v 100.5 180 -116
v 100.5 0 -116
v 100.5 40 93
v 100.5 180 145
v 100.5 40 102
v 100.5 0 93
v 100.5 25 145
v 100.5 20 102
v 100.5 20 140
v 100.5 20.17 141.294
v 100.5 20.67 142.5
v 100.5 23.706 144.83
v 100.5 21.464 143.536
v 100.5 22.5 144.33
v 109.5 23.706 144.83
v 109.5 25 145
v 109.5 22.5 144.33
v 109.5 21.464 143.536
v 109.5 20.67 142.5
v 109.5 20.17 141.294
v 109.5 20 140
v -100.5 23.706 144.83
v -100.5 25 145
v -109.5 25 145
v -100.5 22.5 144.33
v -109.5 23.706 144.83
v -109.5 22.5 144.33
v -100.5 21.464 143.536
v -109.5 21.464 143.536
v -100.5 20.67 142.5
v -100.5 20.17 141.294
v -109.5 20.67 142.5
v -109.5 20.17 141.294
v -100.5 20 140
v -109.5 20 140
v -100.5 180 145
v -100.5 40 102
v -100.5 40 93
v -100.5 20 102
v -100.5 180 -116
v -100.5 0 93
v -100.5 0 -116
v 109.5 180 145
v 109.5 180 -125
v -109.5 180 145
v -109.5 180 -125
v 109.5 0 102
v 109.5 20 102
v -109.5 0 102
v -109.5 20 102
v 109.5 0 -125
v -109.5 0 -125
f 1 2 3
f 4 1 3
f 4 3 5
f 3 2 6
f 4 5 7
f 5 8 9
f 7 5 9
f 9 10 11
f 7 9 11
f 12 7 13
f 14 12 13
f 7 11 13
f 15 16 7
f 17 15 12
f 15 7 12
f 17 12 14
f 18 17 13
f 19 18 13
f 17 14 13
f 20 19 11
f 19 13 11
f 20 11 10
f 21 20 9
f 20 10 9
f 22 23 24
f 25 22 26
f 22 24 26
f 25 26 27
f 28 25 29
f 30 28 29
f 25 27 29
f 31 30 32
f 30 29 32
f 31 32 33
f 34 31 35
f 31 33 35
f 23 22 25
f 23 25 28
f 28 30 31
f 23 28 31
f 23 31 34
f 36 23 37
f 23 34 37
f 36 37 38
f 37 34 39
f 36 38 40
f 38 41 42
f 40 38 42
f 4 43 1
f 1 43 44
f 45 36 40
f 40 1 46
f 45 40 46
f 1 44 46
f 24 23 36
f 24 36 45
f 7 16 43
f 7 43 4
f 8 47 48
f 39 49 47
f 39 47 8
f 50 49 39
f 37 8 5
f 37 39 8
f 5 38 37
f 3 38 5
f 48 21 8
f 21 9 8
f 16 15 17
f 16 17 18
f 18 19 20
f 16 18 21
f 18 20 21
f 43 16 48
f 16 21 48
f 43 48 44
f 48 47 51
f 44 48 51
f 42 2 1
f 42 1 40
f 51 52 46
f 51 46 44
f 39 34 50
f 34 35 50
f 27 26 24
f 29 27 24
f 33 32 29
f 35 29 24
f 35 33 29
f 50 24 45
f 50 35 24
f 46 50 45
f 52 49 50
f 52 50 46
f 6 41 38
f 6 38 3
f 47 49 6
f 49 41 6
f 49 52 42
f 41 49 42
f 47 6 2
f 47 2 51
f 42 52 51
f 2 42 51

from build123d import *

# Parameters (mm, degrees)
SKETCH1_W               = 219
SKETCH1_H               = 250
BOSS_EXTRUDE1_DEPTH     = 3
EXTRUDE_THIN1_DEPTH     = 180
CUT_EXTRUDE2_DEPTH      = 256.764051422
CUT_EXTRUDE2_DEPTH_BACK = 256.764051422
SKETCH4_W               = 65.933085688
SKETCH4_H               = 20
SKETCH7_W               = 201
SKETCH7_H               = 9
BOSS_EXTRUDE3_DEPTH     = 40
FILLET7_R               = 5
SKETCH8_W               = 201
SKETCH8_H               = 209
CUT_EXTRUDE3_DEPTH      = 20


with BuildPart() as part:
    # Sketch1 → Boss-Extrude1 (new body)
    with BuildSketch(Plane(origin=(0, 0, 0), x_dir=(1, 0, 0), z_dir=(0, 1, 0))):
        Rectangle(SKETCH1_W, SKETCH1_H)
    extrude(amount=BOSS_EXTRUDE1_DEPTH)

    # Sketch2 → Extrude-Thin1 (add)
    with BuildSketch(Plane(origin=(0, 0, 0), x_dir=(1, 0, 0), z_dir=(0, 1, 0))):
        Polygon((-109.5, -145), (-109.5, -125), (-109.5, 125), (109.5, 125), (109.5, -125), (109.5, -145), (100.5, -145), (100.5, -125), (100.5, 116), (-100.5, 116), (-100.5, -125), (-100.5, -145), align=None)
    extrude(amount=EXTRUDE_THIN1_DEPTH)

    # Sketch4 → Cut-Extrude2 (cut, two sides: drawn at the far end of the back side and taken through both)
    with BuildSketch(Plane(origin=(0, 0, 0), x_dir=(0, 0, -1), z_dir=(1, 0, 0)).offset(-CUT_EXTRUDE2_DEPTH_BACK)):
        with Locations((-134.966542844, 10)):
            Rectangle(SKETCH4_W, SKETCH4_H)
    extrude(amount=CUT_EXTRUDE2_DEPTH + CUT_EXTRUDE2_DEPTH_BACK, mode=Mode.SUBTRACT)

    # Sketch7 → Boss-Extrude3 (add)
    with BuildSketch(Plane(origin=(0, 0, 0), x_dir=(1, 0, 0), z_dir=(0, 1, 0))):
        with Locations((0, -97.5)):
            Rectangle(SKETCH7_W, SKETCH7_H)
    extrude(amount=BOSS_EXTRUDE3_DEPTH)

    # Fillet7
    fillet7_edges = [part.edges().sort_by_distance(p)[0] for p in [
        (-105, 20, 145),
        (105, 20, 145),
    ]]
    fillet(fillet7_edges, radius=FILLET7_R)

    # Sketch8 → Cut-Extrude3 (cut)
    with BuildSketch(Plane(origin=(0, 0, 0), x_dir=(1, 0, 0), z_dir=(0, 1, 0))):
        with Locations((0, 11.5)):
            Rectangle(SKETCH8_W, SKETCH8_H)
    extrude(amount=CUT_EXTRUDE3_DEPTH, mode=Mode.SUBTRACT)


solid = part.part
